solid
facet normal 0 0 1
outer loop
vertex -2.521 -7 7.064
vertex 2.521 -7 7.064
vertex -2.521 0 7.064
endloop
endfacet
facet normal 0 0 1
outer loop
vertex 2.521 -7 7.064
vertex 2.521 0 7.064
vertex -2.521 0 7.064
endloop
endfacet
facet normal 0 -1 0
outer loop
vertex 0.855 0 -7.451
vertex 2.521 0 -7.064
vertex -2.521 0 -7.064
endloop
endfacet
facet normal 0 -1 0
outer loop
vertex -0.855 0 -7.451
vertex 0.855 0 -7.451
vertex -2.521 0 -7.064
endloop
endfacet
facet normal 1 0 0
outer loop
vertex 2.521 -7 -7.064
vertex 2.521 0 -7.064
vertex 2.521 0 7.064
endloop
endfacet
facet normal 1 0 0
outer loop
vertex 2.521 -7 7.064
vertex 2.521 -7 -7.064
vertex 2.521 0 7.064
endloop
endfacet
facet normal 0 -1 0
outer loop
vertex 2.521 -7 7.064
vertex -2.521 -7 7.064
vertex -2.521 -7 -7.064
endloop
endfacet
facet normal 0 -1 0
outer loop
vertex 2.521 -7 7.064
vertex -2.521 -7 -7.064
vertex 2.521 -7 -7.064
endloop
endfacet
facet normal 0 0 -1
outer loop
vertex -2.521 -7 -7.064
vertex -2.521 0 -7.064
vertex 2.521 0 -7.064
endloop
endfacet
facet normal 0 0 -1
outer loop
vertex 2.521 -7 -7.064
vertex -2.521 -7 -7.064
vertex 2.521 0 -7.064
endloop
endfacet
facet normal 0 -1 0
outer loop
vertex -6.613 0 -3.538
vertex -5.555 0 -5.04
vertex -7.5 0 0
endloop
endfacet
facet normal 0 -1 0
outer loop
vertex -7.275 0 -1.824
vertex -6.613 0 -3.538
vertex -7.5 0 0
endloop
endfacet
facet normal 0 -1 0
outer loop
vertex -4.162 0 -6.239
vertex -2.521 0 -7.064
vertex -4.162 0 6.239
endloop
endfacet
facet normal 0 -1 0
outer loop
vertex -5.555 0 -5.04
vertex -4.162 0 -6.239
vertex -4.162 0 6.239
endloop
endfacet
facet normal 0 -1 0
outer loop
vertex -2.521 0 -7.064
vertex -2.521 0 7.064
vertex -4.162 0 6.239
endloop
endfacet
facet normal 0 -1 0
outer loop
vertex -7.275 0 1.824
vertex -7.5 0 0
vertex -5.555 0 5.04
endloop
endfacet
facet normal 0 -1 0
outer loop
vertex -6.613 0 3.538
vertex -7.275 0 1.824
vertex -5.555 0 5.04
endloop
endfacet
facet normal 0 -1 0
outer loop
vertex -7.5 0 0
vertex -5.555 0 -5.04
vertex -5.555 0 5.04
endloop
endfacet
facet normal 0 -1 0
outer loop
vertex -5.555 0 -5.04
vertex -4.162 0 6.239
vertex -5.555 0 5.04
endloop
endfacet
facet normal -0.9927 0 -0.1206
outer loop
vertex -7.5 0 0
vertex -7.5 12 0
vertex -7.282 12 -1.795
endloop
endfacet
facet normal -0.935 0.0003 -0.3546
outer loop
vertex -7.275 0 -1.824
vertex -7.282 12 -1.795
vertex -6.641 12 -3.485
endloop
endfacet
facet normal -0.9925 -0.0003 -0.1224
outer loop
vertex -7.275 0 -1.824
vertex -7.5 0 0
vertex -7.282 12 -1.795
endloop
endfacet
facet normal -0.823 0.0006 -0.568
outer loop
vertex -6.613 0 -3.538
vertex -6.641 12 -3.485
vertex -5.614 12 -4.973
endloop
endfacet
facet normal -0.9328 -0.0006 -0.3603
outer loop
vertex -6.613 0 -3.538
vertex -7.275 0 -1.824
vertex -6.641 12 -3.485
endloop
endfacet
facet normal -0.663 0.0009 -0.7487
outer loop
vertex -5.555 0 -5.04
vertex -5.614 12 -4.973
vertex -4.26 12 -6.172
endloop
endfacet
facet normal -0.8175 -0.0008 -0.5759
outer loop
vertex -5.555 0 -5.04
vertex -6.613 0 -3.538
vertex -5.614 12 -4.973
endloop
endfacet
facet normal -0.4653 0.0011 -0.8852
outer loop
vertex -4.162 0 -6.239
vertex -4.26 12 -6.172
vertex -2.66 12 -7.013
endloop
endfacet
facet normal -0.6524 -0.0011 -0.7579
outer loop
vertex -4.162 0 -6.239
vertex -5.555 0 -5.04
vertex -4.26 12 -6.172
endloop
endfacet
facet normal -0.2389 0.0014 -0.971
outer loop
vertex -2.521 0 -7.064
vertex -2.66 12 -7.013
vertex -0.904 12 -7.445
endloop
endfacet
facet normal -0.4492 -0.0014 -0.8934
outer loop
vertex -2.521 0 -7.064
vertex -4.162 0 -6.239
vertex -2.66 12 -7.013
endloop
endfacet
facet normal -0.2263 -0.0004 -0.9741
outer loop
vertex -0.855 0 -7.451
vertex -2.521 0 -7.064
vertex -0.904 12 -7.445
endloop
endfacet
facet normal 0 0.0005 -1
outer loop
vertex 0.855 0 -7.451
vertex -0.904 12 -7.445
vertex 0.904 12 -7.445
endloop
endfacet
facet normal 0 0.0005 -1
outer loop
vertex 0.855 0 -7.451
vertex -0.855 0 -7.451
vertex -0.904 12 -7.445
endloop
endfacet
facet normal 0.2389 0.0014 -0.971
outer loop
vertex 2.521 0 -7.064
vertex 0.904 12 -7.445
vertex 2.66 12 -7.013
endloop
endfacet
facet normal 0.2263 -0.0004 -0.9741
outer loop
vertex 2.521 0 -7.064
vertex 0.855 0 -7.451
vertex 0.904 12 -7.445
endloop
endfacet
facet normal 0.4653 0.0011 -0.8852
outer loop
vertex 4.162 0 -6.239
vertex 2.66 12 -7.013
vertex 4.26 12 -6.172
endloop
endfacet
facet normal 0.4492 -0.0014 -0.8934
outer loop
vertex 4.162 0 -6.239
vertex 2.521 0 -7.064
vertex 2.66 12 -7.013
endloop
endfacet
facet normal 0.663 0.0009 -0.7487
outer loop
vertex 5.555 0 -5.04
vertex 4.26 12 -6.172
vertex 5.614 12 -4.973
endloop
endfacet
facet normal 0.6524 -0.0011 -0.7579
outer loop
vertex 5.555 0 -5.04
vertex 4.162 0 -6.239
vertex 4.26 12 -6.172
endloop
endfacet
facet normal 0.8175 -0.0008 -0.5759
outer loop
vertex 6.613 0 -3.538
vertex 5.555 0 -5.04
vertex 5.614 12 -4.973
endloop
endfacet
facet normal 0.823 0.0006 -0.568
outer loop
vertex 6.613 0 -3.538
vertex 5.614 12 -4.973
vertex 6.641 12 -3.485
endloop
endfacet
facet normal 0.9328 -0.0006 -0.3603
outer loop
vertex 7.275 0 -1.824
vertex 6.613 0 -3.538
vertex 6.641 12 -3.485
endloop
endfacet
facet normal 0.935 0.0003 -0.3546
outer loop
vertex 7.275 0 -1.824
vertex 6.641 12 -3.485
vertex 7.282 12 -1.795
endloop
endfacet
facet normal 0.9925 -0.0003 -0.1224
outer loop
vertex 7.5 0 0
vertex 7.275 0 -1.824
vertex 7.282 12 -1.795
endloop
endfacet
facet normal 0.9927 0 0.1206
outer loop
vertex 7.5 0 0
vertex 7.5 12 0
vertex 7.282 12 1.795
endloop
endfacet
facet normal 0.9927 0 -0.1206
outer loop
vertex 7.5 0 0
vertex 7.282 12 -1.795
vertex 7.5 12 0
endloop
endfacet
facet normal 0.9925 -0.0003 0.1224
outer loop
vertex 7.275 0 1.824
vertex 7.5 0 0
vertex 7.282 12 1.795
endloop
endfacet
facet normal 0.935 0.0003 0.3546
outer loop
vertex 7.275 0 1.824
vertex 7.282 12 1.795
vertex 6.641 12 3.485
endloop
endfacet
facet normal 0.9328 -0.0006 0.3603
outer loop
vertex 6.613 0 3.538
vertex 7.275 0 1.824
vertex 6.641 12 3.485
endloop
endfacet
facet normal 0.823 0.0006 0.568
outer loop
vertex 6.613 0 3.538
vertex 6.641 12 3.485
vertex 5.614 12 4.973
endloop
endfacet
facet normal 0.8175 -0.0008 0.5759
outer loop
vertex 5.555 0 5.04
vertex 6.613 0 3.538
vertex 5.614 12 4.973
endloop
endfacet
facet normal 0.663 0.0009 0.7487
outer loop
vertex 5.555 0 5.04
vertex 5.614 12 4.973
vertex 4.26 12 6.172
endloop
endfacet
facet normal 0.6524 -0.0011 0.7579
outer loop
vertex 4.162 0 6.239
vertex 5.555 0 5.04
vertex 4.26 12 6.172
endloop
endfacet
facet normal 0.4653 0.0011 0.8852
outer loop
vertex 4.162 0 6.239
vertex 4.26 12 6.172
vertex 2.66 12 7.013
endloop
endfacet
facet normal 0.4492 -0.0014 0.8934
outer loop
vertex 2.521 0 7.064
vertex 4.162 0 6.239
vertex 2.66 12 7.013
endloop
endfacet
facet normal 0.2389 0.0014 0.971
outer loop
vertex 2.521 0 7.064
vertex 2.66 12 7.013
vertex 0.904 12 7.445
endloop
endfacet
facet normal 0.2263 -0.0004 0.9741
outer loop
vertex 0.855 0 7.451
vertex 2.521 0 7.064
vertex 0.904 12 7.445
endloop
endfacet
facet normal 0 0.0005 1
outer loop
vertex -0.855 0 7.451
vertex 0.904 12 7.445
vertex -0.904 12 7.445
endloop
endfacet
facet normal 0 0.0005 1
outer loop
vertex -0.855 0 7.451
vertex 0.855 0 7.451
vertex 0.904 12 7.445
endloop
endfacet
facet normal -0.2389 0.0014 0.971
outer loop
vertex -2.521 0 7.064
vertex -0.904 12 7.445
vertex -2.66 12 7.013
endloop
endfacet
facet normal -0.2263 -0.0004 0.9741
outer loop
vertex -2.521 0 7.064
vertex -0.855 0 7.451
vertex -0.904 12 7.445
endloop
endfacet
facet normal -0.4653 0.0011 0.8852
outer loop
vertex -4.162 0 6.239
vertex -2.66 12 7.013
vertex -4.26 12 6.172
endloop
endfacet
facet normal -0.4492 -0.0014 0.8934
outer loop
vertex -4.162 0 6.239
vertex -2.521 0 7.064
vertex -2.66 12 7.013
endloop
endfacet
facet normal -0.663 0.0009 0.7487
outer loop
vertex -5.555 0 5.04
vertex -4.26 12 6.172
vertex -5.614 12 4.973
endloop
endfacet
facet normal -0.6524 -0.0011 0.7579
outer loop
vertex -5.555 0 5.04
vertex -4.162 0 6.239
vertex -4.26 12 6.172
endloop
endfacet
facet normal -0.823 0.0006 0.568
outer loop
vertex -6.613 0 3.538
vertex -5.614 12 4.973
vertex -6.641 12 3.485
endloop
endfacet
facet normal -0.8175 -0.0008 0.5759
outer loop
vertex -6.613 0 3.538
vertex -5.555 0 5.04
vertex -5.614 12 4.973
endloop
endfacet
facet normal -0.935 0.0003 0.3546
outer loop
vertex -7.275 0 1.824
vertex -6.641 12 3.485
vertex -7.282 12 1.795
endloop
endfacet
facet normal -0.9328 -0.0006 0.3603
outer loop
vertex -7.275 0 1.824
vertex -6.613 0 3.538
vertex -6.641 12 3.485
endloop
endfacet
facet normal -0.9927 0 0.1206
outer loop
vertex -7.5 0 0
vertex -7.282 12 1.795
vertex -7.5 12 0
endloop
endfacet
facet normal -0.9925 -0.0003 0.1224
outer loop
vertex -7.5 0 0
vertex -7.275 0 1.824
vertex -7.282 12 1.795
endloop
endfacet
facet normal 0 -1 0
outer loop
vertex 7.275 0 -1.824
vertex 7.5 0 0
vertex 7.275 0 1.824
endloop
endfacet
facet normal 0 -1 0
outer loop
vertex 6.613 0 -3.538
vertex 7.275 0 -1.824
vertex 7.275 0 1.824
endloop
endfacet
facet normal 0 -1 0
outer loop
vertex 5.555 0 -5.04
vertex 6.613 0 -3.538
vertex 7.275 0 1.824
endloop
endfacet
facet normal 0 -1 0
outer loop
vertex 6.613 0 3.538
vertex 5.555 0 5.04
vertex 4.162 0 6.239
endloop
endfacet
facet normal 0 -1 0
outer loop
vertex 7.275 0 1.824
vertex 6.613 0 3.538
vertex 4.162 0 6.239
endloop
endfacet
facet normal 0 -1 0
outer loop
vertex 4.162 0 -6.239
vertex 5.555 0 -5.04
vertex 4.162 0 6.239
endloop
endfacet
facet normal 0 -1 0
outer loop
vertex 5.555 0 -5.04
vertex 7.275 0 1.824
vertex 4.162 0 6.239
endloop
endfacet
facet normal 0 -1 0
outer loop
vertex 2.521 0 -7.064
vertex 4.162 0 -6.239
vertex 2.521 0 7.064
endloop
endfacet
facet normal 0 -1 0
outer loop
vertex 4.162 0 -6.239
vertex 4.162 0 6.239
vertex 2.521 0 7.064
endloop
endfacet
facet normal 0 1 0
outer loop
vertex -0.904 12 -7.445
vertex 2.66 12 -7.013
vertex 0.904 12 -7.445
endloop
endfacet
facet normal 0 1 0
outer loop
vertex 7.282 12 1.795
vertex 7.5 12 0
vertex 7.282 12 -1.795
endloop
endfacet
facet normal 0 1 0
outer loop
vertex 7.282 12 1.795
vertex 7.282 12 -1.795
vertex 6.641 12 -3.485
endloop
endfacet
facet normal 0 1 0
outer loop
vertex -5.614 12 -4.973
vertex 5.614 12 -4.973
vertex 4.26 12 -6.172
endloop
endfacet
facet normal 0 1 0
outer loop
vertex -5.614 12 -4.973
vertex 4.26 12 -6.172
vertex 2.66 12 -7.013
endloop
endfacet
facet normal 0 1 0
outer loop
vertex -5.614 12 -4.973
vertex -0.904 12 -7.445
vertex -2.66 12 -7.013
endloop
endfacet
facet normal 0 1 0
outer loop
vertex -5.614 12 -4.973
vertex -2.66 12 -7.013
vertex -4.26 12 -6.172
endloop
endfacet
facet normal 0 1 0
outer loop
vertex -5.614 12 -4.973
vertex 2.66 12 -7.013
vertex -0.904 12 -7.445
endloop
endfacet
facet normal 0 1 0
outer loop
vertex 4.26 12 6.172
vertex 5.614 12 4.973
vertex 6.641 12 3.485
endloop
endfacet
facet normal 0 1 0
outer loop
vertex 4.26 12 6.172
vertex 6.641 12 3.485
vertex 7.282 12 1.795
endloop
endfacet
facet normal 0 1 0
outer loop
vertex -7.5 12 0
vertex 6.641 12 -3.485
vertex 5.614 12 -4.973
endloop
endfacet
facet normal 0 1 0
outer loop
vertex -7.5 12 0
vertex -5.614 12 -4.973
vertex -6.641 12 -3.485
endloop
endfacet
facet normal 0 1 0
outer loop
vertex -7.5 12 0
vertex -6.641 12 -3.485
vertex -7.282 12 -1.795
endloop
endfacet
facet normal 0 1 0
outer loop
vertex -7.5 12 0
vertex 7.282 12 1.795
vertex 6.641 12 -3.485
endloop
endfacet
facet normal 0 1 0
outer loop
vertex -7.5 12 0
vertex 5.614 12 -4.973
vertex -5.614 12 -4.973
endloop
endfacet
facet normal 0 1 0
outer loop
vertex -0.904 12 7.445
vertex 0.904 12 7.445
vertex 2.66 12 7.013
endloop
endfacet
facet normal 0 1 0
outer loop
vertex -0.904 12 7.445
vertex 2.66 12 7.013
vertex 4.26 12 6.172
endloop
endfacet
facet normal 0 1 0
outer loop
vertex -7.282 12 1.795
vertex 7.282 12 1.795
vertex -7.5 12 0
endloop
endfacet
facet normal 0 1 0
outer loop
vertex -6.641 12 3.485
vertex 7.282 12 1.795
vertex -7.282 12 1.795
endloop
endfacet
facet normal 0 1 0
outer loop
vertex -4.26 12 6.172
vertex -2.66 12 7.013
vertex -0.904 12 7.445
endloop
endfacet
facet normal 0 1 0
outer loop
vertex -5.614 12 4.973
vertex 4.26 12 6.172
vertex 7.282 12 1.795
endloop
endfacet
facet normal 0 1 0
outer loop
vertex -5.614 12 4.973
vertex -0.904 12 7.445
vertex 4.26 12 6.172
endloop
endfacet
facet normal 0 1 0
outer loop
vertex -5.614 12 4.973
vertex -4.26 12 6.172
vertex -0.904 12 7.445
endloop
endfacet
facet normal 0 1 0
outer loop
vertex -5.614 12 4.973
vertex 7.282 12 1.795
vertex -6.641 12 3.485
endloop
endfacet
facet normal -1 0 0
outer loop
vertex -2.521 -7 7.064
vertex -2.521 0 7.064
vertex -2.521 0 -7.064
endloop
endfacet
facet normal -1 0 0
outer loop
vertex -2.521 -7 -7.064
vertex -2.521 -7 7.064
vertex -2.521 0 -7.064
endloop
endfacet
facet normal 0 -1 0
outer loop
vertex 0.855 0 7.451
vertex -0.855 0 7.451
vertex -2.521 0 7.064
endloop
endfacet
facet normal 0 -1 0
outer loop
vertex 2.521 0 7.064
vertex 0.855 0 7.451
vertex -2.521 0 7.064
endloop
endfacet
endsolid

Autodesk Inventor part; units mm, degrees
ref_plane "YZ Plane" through (0, 0, 0) normal (1, 0, 0) x (0, 1, 0)
ref_plane "XZ Plane" through (0, 0, 0) normal (0, 1, 0) x (-1, 0, 0)
ref_plane "XY Plane" through (0, 0, 0) normal (0, 0, 1) x (1, 0, 0)
sketch "Sketch1" plane through (0, 0, 0) normal (0, 1, 0) x (-1, 0, 0)
  circle A0 centre (0, 0) radius 7.5
  dimension "d0" = 15
extrude "Extrusion1" add sketch "Sketch1" along normal blind 12
sketch "Sketch2" plane through (0, 0, 0) normal (0, -1, 0) x (1, 0, 0)
  circle A0 centre (0, 0) radius 7.5 projected
  line L0 (-2.5206, -7.0638) -> (2.5206, -7.0638)
  line L1 (2.5206, -7.0638) -> (2.5206, 7.0638)
  line L2 (2.5206, 7.0638) -> (-2.5206, 7.0638)
  line L3 (-2.5206, 7.0638) -> (-2.5206, -7.0638)
  line L4 (-2.5206, -7.0638) -> (2.5206, 7.0638) construction
  line L5 (2.5206, -7.0638) -> (-2.5206, 7.0638) construction
extrude "Extrusion2" add sketch "Sketch2" along normal blind 7 contours L1 L0 L3 L2
thread "Thread1" size "M15x1.5" class "6g" standard "ANSI Metric M Profile" full length
properties part number "voet"
